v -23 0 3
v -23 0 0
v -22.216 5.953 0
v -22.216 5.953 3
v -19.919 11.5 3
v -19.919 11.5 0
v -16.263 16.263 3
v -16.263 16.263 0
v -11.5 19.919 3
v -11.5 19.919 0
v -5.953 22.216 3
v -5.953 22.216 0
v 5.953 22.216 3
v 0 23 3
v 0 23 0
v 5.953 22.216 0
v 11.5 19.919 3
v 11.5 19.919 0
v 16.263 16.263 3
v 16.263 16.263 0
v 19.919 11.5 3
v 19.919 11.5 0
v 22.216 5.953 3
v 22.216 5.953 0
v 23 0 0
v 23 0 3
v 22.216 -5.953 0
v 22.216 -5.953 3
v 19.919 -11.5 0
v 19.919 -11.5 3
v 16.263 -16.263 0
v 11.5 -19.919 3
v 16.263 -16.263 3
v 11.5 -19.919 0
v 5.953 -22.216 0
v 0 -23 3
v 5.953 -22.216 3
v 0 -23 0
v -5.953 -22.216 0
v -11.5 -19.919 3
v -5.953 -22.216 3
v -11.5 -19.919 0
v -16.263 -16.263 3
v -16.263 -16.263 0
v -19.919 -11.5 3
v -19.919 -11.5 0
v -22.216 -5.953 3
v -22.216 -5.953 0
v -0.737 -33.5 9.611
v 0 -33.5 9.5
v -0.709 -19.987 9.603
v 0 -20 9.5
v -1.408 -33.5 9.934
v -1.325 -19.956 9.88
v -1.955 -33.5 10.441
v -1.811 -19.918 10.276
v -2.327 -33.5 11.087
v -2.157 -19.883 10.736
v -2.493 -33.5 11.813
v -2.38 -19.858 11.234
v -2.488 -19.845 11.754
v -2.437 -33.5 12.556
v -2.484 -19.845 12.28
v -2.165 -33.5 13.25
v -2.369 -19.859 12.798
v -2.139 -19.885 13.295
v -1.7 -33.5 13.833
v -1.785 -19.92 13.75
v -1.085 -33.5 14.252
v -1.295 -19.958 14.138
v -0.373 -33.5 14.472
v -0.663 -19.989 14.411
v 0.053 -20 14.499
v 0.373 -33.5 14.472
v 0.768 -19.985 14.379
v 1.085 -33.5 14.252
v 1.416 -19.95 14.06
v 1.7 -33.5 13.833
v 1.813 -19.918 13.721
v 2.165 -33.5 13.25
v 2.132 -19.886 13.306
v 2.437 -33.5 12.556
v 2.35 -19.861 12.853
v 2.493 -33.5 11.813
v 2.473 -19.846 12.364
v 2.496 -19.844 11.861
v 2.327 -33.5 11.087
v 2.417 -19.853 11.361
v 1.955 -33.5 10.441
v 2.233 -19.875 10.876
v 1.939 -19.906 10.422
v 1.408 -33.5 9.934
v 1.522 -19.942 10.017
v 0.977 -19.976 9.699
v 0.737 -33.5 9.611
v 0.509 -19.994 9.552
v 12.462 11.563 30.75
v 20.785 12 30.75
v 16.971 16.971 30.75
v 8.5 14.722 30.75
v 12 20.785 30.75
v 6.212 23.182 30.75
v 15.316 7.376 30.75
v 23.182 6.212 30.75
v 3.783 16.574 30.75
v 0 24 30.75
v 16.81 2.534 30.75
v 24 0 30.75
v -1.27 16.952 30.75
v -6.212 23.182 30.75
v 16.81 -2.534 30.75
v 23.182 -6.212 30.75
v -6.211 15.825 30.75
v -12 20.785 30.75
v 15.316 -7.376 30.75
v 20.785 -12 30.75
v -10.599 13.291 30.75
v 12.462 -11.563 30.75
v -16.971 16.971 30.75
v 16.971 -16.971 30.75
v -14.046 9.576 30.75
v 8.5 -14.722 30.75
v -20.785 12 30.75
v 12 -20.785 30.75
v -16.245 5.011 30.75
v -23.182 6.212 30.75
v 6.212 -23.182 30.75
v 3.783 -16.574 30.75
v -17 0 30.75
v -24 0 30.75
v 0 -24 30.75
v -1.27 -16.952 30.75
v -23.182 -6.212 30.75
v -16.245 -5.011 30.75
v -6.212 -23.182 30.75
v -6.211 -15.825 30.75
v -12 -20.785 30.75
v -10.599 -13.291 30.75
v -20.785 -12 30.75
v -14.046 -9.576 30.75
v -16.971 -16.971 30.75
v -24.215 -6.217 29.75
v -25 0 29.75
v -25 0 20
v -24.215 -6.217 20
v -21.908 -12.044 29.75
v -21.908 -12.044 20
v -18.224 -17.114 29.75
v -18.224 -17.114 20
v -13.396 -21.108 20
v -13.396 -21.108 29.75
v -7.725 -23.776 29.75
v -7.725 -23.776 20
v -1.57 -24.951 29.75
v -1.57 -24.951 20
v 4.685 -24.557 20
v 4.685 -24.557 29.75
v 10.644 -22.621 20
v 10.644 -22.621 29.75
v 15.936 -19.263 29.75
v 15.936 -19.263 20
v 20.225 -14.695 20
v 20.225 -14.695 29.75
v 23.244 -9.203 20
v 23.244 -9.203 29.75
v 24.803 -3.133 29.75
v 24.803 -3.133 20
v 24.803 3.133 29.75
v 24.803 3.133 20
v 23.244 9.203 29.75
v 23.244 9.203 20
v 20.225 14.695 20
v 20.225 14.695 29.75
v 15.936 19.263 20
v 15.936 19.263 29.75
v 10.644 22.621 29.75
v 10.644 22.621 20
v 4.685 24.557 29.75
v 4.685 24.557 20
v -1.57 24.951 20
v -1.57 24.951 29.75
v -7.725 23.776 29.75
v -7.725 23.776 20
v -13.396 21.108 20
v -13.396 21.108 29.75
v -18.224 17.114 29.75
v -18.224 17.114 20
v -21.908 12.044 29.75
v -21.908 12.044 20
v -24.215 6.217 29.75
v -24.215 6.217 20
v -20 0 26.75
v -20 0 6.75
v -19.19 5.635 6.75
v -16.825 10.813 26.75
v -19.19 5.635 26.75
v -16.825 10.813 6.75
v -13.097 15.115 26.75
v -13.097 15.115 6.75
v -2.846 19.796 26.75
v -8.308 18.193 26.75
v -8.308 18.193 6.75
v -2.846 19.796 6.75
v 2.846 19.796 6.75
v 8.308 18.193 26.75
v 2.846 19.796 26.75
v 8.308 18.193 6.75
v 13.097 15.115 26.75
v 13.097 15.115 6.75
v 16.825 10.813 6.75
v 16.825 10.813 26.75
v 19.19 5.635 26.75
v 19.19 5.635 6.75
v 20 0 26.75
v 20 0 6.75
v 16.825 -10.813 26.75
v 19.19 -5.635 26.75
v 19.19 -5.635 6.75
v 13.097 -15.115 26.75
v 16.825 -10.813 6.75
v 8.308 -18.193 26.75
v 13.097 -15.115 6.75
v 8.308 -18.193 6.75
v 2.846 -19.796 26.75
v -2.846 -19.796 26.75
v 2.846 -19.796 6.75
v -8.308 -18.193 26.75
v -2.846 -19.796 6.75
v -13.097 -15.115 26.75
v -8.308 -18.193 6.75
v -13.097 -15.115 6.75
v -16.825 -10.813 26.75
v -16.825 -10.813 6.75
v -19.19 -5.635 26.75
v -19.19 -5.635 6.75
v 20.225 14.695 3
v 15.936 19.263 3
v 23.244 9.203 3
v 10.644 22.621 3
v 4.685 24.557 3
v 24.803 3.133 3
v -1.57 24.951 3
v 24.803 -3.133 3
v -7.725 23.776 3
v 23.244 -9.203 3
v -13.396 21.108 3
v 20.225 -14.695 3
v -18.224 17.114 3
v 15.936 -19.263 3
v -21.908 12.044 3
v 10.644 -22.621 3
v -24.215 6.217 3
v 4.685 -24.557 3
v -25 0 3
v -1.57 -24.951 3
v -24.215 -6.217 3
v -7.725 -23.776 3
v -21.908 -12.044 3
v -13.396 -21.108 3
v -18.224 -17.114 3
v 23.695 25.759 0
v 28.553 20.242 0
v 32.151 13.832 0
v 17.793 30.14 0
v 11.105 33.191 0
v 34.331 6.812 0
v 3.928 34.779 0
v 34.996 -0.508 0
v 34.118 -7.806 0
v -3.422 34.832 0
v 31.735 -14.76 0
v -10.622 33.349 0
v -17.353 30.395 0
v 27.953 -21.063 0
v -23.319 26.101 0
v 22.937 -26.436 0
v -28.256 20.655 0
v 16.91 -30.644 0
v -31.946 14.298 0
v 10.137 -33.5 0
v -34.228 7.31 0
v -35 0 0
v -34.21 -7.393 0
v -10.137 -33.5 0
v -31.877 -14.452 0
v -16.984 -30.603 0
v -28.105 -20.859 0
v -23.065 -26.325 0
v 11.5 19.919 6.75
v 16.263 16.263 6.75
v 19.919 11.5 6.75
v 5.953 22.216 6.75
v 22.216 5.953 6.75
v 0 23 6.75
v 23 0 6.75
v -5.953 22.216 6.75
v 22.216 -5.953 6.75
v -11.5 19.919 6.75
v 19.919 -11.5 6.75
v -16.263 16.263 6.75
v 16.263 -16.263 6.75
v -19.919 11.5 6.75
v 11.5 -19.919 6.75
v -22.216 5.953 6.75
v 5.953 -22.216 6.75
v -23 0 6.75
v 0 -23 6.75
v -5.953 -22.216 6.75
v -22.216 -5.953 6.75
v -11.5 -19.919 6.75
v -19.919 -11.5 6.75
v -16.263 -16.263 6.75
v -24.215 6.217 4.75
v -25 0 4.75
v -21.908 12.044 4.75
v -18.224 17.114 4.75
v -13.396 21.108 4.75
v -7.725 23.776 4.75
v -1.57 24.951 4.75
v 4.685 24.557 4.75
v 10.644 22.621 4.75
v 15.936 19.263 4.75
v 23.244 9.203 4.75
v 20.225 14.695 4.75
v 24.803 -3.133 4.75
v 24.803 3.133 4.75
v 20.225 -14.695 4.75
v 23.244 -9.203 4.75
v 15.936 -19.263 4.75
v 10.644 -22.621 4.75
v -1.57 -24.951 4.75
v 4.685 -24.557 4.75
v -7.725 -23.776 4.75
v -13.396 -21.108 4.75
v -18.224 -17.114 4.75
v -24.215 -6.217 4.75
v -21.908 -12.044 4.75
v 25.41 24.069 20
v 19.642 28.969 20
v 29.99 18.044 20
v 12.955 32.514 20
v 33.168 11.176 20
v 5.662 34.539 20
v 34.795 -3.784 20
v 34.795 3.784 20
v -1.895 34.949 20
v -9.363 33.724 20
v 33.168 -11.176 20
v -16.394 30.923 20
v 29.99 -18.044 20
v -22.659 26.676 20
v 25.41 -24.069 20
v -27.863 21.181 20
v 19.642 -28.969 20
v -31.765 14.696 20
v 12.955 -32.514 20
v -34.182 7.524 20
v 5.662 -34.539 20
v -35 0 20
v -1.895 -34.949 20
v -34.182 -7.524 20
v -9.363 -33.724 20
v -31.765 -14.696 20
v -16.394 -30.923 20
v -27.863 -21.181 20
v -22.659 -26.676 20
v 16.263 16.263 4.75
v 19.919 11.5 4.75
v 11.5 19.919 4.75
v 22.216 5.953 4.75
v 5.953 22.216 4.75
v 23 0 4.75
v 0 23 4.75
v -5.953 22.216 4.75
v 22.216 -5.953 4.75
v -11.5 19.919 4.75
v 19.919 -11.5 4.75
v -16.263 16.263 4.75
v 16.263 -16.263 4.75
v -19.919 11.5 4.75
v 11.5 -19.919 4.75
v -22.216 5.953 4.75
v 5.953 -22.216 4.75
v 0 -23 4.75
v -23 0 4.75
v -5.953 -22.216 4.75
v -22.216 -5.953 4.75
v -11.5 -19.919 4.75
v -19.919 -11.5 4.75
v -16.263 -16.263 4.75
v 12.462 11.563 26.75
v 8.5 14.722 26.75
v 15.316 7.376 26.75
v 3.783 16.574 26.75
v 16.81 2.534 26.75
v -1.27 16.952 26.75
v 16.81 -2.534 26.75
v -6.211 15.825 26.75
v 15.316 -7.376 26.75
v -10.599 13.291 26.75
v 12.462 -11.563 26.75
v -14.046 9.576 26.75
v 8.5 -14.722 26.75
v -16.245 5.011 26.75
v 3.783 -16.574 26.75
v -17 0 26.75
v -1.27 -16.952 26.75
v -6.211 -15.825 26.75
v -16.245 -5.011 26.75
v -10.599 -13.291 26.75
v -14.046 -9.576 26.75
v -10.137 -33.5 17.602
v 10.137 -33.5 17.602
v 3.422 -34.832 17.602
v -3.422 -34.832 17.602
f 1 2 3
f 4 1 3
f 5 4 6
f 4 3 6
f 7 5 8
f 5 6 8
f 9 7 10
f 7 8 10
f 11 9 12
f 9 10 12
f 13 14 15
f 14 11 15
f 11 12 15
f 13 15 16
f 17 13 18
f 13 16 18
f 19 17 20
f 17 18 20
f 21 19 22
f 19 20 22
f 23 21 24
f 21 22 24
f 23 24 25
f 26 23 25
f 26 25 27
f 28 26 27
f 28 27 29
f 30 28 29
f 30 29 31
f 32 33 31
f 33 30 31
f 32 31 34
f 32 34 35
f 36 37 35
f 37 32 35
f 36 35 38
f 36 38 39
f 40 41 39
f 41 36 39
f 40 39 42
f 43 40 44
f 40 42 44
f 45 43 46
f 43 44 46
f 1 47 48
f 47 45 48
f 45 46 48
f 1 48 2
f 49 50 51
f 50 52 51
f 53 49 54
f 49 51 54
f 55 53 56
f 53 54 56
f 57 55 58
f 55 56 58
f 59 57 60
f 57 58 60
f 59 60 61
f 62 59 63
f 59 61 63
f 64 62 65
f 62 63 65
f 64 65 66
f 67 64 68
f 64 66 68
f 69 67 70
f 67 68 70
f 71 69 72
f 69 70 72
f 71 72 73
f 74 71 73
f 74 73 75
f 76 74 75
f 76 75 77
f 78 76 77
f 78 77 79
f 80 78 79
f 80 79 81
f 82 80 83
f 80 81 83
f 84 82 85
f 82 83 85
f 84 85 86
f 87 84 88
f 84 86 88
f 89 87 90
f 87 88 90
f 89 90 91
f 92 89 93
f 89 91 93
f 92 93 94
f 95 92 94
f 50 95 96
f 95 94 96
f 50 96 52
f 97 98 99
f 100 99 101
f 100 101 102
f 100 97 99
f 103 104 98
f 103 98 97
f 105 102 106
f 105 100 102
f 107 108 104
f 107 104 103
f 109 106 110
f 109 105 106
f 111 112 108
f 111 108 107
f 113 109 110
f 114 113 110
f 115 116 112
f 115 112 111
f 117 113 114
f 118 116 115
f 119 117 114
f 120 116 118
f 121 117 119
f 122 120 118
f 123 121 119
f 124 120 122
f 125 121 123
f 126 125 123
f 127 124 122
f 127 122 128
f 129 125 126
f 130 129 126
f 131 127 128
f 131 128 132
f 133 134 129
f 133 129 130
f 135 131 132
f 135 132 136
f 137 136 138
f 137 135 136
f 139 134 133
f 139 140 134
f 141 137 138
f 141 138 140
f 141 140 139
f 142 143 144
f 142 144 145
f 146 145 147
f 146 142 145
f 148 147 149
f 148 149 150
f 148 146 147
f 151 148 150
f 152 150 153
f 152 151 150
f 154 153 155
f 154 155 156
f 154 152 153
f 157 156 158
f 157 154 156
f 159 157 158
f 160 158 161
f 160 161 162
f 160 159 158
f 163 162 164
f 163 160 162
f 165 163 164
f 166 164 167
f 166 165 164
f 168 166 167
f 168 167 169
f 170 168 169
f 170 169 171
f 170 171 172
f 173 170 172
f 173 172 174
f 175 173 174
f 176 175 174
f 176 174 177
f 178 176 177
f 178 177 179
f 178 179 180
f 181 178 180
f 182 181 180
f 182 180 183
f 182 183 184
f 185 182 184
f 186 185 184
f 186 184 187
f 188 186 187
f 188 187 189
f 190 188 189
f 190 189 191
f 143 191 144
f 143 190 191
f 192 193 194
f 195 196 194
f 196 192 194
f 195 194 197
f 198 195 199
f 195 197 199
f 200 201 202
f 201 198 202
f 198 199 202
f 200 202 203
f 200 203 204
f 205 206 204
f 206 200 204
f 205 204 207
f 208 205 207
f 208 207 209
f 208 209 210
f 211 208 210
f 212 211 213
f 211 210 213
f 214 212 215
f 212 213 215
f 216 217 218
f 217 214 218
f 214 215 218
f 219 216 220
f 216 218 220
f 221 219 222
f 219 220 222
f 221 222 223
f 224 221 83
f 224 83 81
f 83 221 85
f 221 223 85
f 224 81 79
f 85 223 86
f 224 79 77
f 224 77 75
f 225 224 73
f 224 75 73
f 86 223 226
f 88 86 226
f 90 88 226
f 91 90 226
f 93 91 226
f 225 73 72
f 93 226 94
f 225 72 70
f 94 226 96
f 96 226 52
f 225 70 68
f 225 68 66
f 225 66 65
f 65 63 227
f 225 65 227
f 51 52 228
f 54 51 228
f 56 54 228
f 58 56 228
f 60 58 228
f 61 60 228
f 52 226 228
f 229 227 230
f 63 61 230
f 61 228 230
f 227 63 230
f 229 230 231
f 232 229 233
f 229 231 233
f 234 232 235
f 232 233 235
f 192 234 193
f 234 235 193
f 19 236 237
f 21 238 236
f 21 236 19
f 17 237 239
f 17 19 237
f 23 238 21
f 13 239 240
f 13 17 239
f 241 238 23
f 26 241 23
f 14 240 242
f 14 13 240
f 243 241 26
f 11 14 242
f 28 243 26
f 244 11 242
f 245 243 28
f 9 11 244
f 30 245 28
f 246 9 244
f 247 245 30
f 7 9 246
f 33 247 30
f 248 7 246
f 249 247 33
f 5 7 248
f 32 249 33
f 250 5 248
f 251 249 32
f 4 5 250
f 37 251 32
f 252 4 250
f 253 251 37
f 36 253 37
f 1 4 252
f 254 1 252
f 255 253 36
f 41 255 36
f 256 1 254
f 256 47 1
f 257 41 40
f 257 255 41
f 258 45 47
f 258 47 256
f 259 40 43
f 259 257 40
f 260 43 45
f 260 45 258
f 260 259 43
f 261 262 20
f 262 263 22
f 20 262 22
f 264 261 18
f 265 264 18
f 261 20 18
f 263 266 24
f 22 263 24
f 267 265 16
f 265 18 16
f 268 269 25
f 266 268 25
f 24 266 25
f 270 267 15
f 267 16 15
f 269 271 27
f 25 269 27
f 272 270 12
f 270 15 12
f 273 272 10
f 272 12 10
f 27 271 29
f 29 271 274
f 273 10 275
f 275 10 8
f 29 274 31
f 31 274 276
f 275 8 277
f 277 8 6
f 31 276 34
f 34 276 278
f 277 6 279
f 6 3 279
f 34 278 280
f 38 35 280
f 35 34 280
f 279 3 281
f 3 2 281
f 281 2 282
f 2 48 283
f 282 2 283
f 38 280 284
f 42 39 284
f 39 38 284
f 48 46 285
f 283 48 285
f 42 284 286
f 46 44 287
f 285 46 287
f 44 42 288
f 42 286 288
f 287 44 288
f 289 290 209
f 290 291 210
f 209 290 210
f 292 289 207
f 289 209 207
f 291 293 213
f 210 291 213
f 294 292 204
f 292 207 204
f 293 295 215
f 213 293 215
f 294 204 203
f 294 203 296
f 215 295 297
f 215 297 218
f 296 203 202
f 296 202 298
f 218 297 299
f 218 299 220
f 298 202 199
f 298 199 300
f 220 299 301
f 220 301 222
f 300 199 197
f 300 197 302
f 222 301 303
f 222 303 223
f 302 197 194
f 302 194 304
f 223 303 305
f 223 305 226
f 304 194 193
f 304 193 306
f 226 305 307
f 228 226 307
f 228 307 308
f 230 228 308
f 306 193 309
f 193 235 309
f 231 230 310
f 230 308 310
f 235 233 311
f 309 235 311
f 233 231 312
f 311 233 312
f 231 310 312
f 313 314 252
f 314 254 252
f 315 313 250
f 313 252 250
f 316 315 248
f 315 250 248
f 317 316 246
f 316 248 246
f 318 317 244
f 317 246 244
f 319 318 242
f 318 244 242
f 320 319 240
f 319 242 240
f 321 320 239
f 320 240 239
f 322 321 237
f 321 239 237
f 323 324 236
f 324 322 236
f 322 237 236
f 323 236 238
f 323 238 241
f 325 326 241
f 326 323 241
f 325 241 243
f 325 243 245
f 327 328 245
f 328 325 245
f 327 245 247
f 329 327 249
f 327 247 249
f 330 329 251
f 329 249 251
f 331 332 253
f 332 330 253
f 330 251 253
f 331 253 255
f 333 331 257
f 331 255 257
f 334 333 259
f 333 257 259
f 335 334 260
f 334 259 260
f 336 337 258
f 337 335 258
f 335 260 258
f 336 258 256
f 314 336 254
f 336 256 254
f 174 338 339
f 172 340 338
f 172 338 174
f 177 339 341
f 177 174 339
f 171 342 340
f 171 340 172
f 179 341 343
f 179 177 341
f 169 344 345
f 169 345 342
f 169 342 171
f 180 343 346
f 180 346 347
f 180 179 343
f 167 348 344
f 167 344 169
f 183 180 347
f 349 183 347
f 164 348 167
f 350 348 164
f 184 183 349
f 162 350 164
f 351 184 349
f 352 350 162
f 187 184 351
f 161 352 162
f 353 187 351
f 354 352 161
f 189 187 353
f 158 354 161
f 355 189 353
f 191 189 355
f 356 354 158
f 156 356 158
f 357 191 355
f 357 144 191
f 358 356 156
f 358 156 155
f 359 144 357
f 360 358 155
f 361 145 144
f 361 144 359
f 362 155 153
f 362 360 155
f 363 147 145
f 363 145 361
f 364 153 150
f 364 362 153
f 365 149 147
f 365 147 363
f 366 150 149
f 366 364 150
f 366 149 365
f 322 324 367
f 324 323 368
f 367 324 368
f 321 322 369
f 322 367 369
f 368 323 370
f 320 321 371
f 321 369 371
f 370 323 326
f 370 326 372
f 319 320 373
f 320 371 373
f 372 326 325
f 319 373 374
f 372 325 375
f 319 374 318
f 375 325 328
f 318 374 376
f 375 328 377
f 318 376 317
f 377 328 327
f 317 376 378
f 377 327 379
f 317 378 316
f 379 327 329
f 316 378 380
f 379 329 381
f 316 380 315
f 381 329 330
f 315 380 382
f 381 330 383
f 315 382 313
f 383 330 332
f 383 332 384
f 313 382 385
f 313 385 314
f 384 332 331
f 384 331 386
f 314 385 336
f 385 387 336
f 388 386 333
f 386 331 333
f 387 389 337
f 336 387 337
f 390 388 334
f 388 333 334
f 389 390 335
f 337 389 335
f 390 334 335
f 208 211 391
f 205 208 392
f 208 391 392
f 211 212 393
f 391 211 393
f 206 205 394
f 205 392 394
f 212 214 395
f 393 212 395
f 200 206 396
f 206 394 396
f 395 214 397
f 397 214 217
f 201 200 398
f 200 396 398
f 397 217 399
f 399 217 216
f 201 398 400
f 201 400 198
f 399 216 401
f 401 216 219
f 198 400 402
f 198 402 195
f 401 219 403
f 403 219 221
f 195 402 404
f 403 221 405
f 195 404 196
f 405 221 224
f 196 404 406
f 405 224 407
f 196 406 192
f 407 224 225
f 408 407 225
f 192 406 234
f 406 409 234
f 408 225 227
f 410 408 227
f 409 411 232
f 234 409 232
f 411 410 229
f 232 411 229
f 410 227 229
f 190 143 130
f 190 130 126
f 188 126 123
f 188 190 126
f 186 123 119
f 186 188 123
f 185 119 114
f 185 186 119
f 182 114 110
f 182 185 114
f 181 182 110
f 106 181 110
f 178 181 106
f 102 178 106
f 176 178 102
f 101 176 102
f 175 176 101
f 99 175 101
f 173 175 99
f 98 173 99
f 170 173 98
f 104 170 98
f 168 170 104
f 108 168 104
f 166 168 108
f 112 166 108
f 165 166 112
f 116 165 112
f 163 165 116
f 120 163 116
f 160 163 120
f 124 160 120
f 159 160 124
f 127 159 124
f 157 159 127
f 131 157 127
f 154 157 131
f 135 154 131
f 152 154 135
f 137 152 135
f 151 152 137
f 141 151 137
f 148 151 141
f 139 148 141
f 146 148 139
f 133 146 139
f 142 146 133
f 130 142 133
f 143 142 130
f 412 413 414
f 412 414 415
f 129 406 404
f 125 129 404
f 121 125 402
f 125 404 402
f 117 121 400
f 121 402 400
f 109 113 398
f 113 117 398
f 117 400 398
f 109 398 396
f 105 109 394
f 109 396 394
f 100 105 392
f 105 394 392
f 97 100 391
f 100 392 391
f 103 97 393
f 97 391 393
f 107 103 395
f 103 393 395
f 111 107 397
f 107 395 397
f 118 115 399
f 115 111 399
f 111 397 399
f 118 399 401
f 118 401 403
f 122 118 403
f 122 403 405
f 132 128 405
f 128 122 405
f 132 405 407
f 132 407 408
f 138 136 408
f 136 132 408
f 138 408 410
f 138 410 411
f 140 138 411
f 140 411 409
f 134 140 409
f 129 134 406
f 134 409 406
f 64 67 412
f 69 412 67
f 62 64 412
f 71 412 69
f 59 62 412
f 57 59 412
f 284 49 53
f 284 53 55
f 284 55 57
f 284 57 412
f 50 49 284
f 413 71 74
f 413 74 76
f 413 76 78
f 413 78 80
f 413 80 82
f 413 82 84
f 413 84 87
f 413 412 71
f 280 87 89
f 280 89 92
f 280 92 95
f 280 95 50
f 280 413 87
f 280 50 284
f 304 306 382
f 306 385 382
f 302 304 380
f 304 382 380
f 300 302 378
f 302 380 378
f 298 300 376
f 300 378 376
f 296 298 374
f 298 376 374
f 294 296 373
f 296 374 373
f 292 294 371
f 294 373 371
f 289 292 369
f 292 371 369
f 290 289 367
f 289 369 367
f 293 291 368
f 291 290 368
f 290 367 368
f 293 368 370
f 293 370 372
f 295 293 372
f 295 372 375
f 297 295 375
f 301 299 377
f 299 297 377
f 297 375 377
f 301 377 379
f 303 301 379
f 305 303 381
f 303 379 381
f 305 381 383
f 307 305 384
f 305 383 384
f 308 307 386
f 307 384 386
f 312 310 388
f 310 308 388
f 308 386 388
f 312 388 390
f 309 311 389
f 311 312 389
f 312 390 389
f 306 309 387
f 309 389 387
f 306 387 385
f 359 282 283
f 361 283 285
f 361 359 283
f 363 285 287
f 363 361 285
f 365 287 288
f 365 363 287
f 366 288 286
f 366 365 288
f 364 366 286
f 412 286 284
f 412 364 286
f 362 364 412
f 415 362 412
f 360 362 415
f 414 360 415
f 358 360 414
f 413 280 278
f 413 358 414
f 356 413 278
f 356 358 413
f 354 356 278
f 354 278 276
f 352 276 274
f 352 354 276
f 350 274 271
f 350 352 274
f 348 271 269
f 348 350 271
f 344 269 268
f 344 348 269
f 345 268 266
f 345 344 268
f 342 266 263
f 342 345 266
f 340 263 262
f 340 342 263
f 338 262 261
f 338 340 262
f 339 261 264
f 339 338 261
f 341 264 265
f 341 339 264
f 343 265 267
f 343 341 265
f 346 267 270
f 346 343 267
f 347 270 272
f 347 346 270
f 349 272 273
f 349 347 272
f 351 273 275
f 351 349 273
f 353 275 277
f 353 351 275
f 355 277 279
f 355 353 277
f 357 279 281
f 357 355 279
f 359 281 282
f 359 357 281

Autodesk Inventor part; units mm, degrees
ref_plane "XZ Plane" through (0, 0, 0) normal (0, 1, 0) x (-1, 0, 0)
ref_plane "XY Plane" through (0, 0, 0) normal (0, 0, 1) x (1, 0, 0)
sketch "Skizze1" plane through (0, 0, 0) normal (0, 1, 0) x (-1, 0, 0)
  line L0 (17, 30.75) -> (17, 26.75)
  line L1 (17, 26.75) -> (20, 26.75)
  line L2 (20, 26.75) -> (20, 6.75)
  line L3 (23, 0) -> (35, 0)
  line L4 (35, 0) -> (35, 20)
  line L5 (35, 20) -> (25, 20)
  line L6 (25, 20) -> (25, 30.75)
  line L7 (17, 30.75) -> (25, 30.75)
  line L8 (0, 0) -> (0, 48.4152)
  line L9 (20, 6.75) -> (23, 6.75)
  line L10 (23, 6.75) -> (23, 4.75)
  line L11 (23, 4.75) -> (25, 4.75)
  line L12 (25, 4.75) -> (25, 3)
  line L13 (25, 3) -> (23, 3)
  line L14 (23, 3) -> (23, 0)
  point P0 (17, 4)
  dimension "d1" = 40
  dimension "d3" = 20
  dimension "d4" = 70
  dimension "d5" = 50
  dimension "d7" = 4
  dimension "d10" = 2
  dimension "d11" = 1.75
  dimension "d12" = 3
  dimension "d13" = 3
  dimension "d14" = 2
  dimension "d15" = 34
  dimension "d16" = 20
revolve "Umdrehung1" add sketch "Skizze1" angle 360 about axis through (0, 0, 0) along (0, 0, 1)
ref_plane "Arbeitsebene1" through (35, 0, 10) normal (1, 0, 0) x (0, 1, 0)
sketch "Skizze5" plane through (35, 0, 10) normal (1, 0, 0) x (0, 1, 0)
  line L0 (-36.029, 7.6022) -> (-33.5, 7.6022)
  line L1 (-33.5, 7.6022) -> (-33.5, -10.6796)
  line L2 (-33.5, -10.6796) -> (-36.029, -10.6796)
  line L3 (-36.029, -10.6796) -> (-36.029, 7.6022)
  line L4 (0, 27.0359) -> (0, -16.9655) projected
  point P0 (0, -10)
  dimension "d37" = 33.5
extrude "Extrusion3" cut sketch "Skizze5" against normal through all
sketch "Skizze6" plane through (-10.1366, -33.5, 0) normal (0, -1, 0) x (1, 0, 0)
  line L0 (20.2731, 0) -> (0, 0) projected
  point P0 (10.1366, 0)
  point P1 (10.1366, 12)
  dimension "d47" = 12
hole "Bohrung2" at (0, -33.5, 12) direction (0, 1, 0) diameter 5 end up to surface
thread "Gewinde1" size "M6x1" class "6H" standard "ANSI Metric M Profile" full length
chamfer "Fase2" distance 1 angle 45 1 edges at (25, 0, 30.75)
properties part number "KON_Nietmaschine_Deckel" material "Stahl"
